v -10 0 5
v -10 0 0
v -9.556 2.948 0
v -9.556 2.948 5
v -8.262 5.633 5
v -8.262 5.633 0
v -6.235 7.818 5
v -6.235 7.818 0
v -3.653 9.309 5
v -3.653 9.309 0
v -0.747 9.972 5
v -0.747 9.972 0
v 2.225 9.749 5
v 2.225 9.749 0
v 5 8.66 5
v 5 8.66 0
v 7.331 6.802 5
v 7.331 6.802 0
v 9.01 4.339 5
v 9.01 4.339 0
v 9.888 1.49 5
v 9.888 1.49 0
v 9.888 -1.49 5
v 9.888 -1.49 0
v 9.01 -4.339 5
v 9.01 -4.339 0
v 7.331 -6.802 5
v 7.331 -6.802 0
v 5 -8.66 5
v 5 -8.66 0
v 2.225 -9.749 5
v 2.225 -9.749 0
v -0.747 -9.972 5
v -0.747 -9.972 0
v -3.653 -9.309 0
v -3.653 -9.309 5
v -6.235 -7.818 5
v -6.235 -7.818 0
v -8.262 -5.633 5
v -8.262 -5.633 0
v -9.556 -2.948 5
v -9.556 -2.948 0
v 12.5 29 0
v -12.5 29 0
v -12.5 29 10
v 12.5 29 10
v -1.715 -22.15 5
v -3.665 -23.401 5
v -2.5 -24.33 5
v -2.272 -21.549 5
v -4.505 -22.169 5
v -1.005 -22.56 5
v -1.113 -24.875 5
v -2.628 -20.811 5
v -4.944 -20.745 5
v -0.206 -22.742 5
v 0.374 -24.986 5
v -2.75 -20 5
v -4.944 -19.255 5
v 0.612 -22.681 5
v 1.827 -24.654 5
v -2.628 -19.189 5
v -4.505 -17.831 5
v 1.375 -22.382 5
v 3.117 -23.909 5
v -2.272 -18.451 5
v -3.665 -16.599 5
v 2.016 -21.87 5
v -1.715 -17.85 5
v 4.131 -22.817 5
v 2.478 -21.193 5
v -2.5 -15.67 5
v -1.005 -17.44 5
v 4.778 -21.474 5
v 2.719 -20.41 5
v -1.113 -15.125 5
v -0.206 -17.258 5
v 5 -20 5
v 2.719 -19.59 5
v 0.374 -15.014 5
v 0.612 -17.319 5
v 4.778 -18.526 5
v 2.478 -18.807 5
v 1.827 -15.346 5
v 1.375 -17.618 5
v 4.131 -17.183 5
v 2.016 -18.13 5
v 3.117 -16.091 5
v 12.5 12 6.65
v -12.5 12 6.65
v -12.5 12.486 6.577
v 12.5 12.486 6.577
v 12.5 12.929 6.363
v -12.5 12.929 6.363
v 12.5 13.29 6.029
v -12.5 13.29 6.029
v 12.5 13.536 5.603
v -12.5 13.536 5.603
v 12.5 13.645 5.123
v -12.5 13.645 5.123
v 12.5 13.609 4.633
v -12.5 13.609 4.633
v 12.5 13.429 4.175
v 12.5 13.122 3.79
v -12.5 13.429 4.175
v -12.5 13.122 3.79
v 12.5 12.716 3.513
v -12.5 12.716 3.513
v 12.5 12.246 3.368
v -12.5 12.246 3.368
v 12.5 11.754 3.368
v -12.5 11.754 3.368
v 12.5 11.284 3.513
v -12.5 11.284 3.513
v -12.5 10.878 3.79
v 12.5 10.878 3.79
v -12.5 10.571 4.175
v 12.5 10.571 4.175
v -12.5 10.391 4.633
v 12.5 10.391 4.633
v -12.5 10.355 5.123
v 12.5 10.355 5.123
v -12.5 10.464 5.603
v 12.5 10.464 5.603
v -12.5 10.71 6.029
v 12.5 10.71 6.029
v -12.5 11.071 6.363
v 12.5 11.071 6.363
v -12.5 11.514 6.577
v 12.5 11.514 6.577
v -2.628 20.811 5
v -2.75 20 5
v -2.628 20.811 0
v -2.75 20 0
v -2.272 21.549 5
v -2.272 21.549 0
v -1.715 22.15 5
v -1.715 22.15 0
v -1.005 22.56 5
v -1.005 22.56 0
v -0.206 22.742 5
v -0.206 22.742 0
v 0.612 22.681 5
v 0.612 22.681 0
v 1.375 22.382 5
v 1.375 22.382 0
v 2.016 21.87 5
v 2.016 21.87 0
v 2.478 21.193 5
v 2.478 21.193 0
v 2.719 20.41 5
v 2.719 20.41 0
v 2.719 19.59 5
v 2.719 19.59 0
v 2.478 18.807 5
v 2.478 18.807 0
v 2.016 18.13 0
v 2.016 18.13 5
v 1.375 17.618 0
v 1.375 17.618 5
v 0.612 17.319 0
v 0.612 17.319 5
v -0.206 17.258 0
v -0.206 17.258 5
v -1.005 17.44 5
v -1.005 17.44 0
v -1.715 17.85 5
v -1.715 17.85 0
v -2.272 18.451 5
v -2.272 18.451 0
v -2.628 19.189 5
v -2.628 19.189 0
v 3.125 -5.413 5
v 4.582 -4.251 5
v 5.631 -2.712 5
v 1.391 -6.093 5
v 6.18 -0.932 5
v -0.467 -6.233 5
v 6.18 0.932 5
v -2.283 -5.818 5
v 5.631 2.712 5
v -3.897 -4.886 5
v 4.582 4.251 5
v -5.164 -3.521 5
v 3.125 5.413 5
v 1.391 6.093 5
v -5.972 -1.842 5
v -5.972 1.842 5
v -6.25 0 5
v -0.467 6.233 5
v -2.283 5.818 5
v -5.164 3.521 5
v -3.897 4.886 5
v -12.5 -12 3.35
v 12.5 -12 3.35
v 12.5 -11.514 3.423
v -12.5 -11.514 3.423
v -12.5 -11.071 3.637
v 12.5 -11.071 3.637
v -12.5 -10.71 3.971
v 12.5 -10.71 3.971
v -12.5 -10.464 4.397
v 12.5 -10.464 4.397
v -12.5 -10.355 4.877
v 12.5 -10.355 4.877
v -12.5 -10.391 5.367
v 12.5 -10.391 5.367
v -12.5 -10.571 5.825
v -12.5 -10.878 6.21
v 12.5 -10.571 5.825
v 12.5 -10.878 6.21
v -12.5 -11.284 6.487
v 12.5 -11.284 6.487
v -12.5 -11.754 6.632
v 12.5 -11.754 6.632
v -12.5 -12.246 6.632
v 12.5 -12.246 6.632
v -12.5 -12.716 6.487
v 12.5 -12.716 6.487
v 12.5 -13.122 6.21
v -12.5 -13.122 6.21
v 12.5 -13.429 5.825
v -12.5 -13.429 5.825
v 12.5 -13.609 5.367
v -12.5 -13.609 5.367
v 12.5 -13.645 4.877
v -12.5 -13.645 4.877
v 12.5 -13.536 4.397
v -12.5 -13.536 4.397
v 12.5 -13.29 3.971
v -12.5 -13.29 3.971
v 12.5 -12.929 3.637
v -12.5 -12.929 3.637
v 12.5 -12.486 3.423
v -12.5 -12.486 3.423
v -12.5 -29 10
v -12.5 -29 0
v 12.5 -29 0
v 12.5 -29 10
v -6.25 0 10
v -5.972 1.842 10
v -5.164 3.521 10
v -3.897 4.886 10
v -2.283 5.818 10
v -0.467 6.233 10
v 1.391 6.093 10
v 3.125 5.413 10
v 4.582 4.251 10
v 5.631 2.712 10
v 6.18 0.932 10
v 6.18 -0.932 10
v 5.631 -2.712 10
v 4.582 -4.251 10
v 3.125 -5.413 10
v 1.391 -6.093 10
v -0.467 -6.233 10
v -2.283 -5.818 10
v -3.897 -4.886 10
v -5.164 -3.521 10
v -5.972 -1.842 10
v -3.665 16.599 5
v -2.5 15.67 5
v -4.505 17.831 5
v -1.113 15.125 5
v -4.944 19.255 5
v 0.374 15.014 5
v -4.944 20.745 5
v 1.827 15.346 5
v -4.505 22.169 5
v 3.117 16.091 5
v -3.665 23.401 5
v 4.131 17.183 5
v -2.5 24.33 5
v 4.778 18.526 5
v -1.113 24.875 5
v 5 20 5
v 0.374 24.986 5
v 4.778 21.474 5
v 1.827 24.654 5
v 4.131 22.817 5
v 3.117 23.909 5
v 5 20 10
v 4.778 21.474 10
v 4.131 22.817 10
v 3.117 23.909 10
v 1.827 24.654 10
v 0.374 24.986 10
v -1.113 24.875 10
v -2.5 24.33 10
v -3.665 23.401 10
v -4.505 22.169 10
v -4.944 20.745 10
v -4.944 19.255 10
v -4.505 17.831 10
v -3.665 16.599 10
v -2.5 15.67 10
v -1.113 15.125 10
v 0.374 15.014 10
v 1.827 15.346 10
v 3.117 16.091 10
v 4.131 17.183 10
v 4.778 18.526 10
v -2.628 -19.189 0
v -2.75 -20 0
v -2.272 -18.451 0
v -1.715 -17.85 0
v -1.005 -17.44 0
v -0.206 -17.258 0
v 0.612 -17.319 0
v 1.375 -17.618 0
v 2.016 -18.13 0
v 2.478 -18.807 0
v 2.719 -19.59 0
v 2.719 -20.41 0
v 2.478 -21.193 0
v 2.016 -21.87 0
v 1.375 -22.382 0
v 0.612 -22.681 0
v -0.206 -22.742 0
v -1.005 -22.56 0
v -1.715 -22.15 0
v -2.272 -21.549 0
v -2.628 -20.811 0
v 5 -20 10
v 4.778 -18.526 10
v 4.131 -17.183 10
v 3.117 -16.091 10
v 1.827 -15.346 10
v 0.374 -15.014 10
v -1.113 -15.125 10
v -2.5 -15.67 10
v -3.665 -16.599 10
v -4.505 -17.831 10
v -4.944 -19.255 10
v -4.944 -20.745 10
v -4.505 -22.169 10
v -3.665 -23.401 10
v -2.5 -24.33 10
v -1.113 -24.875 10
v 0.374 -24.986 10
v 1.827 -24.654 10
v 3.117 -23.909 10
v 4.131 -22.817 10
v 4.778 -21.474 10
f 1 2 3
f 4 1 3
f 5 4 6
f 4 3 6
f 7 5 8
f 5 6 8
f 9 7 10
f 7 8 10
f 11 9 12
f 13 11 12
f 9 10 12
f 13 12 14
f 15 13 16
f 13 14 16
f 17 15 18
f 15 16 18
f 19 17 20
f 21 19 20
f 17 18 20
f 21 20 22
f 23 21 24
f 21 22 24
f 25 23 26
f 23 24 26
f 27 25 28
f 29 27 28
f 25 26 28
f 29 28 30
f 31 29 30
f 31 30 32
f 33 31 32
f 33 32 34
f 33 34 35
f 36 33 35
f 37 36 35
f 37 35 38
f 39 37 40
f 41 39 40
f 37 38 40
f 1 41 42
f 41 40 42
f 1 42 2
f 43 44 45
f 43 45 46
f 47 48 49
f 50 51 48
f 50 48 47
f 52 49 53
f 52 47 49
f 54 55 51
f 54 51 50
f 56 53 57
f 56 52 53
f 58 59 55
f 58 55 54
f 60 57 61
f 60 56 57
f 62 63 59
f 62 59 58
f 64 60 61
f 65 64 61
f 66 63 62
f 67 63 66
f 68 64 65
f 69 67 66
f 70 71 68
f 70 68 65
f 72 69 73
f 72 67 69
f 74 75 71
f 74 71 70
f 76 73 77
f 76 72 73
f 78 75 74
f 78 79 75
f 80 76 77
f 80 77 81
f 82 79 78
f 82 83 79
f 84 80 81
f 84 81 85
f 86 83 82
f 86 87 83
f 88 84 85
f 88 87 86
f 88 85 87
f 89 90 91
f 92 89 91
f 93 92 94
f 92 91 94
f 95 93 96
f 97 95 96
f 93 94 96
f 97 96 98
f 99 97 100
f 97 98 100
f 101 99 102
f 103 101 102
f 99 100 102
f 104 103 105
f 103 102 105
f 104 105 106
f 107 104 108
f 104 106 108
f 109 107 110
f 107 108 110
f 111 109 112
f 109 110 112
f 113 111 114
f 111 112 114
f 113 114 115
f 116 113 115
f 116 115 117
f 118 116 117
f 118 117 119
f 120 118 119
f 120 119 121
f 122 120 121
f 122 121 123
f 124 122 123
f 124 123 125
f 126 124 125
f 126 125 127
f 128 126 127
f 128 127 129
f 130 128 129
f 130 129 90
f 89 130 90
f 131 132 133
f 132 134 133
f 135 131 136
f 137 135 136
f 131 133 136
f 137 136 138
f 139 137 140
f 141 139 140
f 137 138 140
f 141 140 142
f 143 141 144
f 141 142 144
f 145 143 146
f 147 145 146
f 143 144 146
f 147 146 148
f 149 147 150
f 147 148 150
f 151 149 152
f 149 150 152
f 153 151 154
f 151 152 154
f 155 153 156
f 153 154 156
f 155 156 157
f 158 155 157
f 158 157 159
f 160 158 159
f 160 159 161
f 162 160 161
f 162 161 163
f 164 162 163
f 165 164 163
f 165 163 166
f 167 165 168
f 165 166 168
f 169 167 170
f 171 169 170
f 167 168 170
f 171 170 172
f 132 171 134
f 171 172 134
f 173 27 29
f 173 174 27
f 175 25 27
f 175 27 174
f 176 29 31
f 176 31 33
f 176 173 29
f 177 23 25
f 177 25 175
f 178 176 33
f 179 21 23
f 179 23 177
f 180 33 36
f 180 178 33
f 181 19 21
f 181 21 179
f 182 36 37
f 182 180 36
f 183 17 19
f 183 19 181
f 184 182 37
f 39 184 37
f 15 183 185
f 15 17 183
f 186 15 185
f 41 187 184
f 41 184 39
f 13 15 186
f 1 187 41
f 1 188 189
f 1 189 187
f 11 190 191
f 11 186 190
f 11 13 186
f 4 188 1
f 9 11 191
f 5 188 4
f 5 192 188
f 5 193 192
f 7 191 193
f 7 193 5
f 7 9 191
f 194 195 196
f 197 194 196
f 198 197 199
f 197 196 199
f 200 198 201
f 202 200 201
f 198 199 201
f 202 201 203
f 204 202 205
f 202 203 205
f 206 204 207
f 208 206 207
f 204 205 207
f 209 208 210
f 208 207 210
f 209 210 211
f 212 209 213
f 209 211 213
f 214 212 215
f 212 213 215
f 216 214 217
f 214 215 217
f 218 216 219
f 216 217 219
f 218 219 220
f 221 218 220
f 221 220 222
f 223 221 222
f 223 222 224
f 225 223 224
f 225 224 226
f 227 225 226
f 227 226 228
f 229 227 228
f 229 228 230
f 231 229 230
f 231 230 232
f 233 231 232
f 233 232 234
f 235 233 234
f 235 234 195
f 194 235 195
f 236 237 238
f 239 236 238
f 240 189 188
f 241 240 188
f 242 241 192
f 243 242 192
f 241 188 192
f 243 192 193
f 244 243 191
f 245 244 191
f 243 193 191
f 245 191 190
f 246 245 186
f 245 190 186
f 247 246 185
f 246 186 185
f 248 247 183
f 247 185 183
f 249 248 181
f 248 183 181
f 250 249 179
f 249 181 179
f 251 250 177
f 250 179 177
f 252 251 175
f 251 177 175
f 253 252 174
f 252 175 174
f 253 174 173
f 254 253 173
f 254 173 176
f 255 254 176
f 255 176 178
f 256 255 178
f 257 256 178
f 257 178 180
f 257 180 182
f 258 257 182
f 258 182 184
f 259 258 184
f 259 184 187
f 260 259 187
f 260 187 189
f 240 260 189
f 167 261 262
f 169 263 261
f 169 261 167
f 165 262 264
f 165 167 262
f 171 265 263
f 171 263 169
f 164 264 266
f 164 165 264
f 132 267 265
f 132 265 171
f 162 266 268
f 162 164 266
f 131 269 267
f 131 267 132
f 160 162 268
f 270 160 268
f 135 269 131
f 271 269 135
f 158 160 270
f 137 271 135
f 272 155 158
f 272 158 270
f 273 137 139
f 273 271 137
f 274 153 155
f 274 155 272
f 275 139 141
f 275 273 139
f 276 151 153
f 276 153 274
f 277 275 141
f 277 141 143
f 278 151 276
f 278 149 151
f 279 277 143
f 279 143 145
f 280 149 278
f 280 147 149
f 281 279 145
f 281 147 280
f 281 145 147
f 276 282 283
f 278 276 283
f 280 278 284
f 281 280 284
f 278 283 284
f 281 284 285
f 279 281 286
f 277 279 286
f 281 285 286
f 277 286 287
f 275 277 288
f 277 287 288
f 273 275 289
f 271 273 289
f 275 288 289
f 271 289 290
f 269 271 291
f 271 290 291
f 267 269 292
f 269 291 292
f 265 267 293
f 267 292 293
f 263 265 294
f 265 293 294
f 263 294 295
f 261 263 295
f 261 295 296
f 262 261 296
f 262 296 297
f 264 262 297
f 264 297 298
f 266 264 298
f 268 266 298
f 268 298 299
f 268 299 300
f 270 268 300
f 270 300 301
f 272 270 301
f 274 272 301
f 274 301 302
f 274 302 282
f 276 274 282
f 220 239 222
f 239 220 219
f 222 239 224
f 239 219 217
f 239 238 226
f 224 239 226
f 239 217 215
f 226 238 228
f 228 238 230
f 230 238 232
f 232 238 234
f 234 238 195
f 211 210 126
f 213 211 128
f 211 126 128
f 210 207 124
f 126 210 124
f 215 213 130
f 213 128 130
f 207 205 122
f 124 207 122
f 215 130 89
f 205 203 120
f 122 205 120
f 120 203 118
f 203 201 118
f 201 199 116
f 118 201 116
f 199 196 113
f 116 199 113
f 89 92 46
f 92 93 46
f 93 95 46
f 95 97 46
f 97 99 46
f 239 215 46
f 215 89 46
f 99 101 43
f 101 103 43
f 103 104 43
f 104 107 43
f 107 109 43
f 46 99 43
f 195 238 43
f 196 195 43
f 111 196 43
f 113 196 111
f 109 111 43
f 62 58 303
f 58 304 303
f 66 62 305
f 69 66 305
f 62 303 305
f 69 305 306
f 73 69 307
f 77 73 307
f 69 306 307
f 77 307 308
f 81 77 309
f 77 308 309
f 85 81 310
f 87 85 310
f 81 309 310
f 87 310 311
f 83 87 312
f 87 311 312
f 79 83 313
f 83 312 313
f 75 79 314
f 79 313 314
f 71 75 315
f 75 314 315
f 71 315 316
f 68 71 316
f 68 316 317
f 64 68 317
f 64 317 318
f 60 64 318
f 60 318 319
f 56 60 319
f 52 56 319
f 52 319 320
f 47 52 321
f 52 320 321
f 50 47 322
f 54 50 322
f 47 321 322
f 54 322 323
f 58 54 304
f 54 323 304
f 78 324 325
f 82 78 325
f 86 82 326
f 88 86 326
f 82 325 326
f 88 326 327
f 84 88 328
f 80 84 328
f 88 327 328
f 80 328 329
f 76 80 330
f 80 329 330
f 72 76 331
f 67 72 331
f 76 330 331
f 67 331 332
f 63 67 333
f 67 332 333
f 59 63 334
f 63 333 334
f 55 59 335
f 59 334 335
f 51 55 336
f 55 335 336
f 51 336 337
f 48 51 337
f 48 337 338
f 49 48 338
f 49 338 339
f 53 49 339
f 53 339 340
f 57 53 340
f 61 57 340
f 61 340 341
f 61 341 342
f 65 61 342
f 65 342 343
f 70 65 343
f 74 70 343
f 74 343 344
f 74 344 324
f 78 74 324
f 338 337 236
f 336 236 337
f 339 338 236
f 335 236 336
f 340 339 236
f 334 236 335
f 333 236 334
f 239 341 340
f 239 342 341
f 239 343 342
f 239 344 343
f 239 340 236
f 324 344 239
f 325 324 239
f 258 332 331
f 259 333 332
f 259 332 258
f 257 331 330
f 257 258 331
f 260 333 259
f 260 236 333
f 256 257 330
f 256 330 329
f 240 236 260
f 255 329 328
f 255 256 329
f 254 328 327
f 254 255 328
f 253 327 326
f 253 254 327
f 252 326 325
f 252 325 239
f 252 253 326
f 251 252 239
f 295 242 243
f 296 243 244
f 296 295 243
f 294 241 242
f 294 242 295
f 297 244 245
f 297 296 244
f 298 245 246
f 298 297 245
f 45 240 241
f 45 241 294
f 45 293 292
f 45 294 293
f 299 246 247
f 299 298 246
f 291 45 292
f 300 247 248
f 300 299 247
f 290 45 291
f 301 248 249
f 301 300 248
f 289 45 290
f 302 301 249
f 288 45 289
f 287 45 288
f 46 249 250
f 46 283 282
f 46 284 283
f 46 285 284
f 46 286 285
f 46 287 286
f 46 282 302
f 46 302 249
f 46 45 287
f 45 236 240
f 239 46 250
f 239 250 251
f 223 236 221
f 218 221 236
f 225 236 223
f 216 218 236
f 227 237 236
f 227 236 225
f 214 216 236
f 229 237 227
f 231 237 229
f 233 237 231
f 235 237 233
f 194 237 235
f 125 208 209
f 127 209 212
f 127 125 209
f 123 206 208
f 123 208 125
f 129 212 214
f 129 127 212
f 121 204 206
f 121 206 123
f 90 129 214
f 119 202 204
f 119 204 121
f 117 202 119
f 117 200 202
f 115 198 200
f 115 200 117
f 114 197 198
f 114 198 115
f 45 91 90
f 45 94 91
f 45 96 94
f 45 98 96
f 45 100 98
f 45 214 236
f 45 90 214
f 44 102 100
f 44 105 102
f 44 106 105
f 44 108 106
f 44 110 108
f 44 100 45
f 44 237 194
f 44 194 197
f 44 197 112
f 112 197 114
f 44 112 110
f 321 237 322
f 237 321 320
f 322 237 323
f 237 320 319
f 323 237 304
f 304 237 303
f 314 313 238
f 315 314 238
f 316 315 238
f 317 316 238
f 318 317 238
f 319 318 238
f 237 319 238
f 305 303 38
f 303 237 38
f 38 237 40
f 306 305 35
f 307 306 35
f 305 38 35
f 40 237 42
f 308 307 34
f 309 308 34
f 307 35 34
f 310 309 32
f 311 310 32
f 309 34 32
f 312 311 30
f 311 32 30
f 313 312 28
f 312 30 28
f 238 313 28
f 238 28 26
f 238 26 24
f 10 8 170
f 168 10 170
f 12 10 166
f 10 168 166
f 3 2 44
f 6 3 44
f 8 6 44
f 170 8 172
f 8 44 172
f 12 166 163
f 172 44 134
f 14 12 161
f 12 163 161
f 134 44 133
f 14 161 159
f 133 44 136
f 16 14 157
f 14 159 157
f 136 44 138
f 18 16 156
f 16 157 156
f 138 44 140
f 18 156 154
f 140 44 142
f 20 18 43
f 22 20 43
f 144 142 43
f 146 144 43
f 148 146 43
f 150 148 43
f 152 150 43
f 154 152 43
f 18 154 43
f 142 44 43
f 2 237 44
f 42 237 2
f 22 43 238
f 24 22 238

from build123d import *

# Parameters (mm, degrees)
ESQUISSE1_W                                        = 25
ESQUISSE1_H                                        = 58
BOSS_EXTRU_1_DEPTH                                 = 10
ESQUISSE3_R                                        = 10
ENL_V_MAT_EXTRU_2_DEPTH                            = 5
ESQUISSE4_R                                        = 6.25
ENL_V_MAT_EXTRU_3_DEPTH                            = 6
CHAMBRAGE_POUR_VIS_T_TE_HEXAGONALE_M51_D           = 5.5
CHAMBRAGE_POUR_VIS_T_TE_HEXAGONALE_M51_CBORE_D     = 10
CHAMBRAGE_POUR_VIS_T_TE_HEXAGONALE_M51_CBORE_DEPTH = 5
CHAMBRAGE_POUR_VIS_T_TE_HEXAGONALE_M53_D           = 5.5
CHAMBRAGE_POUR_VIS_T_TE_HEXAGONALE_M53_CBORE_D     = 10
CHAMBRAGE_POUR_VIS_T_TE_HEXAGONALE_M53_CBORE_DEPTH = 5
TROU_TARAUD_M43_D                                  = 3.3
TROU_TARAUD_M42_D                                  = 3.3


with BuildPart() as part:
    # Esquisse1 → Boss.-Extru.1 (new body)
    with BuildSketch(Plane.XY):
        Rectangle(ESQUISSE1_W, ESQUISSE1_H)
    extrude(amount=BOSS_EXTRU_1_DEPTH)

    # Esquisse3 → Enlèv. mat.-Extru.2 (cut)
    with BuildSketch(Plane(origin=(0, 0, 0), x_dir=(-1, 0, 0), z_dir=(0, 0, -1))):
        Circle(ESQUISSE3_R)
    extrude(amount=-ENL_V_MAT_EXTRU_2_DEPTH, mode=Mode.SUBTRACT)

    # Esquisse4 → Enlèv. mat.-Extru.3 (cut, through all)
    with BuildSketch(Plane(origin=(0, 0, 5), x_dir=(-1, 0, 0), z_dir=(0, 0, -1))):
        Circle(ESQUISSE4_R)
    extrude(amount=-ENL_V_MAT_EXTRU_3_DEPTH, mode=Mode.SUBTRACT)

    # Chambrage pour vis à tête hexagonale M51 (through all)
    with Locations(Plane.XY.offset(10)):
        with Locations((0, -20)):
            CounterBoreHole(CHAMBRAGE_POUR_VIS_T_TE_HEXAGONALE_M51_D / 2, CHAMBRAGE_POUR_VIS_T_TE_HEXAGONALE_M51_CBORE_D / 2, CHAMBRAGE_POUR_VIS_T_TE_HEXAGONALE_M51_CBORE_DEPTH)

    # Chambrage pour vis à tête hexagonale M53 (through all)
    with Locations(Plane.XY.offset(10)):
        with Locations((0, 20)):
            CounterBoreHole(CHAMBRAGE_POUR_VIS_T_TE_HEXAGONALE_M53_D / 2, CHAMBRAGE_POUR_VIS_T_TE_HEXAGONALE_M53_CBORE_D / 2, CHAMBRAGE_POUR_VIS_T_TE_HEXAGONALE_M53_CBORE_DEPTH)

    # Trou taraudé M43 (through all)
    with Locations(Plane(origin=(12.5, 0, 0), x_dir=(0, 0, -1), z_dir=(1, 0, 0))):
        with Locations((-5, 12)):
            Hole(TROU_TARAUD_M43_D / 2)

    # Trou taraudé M42 (through all)
    with Locations(Plane.ZY.offset(12.5)):
        with Locations((5, -12)):
            Hole(TROU_TARAUD_M42_D / 2)


solid = part.part
